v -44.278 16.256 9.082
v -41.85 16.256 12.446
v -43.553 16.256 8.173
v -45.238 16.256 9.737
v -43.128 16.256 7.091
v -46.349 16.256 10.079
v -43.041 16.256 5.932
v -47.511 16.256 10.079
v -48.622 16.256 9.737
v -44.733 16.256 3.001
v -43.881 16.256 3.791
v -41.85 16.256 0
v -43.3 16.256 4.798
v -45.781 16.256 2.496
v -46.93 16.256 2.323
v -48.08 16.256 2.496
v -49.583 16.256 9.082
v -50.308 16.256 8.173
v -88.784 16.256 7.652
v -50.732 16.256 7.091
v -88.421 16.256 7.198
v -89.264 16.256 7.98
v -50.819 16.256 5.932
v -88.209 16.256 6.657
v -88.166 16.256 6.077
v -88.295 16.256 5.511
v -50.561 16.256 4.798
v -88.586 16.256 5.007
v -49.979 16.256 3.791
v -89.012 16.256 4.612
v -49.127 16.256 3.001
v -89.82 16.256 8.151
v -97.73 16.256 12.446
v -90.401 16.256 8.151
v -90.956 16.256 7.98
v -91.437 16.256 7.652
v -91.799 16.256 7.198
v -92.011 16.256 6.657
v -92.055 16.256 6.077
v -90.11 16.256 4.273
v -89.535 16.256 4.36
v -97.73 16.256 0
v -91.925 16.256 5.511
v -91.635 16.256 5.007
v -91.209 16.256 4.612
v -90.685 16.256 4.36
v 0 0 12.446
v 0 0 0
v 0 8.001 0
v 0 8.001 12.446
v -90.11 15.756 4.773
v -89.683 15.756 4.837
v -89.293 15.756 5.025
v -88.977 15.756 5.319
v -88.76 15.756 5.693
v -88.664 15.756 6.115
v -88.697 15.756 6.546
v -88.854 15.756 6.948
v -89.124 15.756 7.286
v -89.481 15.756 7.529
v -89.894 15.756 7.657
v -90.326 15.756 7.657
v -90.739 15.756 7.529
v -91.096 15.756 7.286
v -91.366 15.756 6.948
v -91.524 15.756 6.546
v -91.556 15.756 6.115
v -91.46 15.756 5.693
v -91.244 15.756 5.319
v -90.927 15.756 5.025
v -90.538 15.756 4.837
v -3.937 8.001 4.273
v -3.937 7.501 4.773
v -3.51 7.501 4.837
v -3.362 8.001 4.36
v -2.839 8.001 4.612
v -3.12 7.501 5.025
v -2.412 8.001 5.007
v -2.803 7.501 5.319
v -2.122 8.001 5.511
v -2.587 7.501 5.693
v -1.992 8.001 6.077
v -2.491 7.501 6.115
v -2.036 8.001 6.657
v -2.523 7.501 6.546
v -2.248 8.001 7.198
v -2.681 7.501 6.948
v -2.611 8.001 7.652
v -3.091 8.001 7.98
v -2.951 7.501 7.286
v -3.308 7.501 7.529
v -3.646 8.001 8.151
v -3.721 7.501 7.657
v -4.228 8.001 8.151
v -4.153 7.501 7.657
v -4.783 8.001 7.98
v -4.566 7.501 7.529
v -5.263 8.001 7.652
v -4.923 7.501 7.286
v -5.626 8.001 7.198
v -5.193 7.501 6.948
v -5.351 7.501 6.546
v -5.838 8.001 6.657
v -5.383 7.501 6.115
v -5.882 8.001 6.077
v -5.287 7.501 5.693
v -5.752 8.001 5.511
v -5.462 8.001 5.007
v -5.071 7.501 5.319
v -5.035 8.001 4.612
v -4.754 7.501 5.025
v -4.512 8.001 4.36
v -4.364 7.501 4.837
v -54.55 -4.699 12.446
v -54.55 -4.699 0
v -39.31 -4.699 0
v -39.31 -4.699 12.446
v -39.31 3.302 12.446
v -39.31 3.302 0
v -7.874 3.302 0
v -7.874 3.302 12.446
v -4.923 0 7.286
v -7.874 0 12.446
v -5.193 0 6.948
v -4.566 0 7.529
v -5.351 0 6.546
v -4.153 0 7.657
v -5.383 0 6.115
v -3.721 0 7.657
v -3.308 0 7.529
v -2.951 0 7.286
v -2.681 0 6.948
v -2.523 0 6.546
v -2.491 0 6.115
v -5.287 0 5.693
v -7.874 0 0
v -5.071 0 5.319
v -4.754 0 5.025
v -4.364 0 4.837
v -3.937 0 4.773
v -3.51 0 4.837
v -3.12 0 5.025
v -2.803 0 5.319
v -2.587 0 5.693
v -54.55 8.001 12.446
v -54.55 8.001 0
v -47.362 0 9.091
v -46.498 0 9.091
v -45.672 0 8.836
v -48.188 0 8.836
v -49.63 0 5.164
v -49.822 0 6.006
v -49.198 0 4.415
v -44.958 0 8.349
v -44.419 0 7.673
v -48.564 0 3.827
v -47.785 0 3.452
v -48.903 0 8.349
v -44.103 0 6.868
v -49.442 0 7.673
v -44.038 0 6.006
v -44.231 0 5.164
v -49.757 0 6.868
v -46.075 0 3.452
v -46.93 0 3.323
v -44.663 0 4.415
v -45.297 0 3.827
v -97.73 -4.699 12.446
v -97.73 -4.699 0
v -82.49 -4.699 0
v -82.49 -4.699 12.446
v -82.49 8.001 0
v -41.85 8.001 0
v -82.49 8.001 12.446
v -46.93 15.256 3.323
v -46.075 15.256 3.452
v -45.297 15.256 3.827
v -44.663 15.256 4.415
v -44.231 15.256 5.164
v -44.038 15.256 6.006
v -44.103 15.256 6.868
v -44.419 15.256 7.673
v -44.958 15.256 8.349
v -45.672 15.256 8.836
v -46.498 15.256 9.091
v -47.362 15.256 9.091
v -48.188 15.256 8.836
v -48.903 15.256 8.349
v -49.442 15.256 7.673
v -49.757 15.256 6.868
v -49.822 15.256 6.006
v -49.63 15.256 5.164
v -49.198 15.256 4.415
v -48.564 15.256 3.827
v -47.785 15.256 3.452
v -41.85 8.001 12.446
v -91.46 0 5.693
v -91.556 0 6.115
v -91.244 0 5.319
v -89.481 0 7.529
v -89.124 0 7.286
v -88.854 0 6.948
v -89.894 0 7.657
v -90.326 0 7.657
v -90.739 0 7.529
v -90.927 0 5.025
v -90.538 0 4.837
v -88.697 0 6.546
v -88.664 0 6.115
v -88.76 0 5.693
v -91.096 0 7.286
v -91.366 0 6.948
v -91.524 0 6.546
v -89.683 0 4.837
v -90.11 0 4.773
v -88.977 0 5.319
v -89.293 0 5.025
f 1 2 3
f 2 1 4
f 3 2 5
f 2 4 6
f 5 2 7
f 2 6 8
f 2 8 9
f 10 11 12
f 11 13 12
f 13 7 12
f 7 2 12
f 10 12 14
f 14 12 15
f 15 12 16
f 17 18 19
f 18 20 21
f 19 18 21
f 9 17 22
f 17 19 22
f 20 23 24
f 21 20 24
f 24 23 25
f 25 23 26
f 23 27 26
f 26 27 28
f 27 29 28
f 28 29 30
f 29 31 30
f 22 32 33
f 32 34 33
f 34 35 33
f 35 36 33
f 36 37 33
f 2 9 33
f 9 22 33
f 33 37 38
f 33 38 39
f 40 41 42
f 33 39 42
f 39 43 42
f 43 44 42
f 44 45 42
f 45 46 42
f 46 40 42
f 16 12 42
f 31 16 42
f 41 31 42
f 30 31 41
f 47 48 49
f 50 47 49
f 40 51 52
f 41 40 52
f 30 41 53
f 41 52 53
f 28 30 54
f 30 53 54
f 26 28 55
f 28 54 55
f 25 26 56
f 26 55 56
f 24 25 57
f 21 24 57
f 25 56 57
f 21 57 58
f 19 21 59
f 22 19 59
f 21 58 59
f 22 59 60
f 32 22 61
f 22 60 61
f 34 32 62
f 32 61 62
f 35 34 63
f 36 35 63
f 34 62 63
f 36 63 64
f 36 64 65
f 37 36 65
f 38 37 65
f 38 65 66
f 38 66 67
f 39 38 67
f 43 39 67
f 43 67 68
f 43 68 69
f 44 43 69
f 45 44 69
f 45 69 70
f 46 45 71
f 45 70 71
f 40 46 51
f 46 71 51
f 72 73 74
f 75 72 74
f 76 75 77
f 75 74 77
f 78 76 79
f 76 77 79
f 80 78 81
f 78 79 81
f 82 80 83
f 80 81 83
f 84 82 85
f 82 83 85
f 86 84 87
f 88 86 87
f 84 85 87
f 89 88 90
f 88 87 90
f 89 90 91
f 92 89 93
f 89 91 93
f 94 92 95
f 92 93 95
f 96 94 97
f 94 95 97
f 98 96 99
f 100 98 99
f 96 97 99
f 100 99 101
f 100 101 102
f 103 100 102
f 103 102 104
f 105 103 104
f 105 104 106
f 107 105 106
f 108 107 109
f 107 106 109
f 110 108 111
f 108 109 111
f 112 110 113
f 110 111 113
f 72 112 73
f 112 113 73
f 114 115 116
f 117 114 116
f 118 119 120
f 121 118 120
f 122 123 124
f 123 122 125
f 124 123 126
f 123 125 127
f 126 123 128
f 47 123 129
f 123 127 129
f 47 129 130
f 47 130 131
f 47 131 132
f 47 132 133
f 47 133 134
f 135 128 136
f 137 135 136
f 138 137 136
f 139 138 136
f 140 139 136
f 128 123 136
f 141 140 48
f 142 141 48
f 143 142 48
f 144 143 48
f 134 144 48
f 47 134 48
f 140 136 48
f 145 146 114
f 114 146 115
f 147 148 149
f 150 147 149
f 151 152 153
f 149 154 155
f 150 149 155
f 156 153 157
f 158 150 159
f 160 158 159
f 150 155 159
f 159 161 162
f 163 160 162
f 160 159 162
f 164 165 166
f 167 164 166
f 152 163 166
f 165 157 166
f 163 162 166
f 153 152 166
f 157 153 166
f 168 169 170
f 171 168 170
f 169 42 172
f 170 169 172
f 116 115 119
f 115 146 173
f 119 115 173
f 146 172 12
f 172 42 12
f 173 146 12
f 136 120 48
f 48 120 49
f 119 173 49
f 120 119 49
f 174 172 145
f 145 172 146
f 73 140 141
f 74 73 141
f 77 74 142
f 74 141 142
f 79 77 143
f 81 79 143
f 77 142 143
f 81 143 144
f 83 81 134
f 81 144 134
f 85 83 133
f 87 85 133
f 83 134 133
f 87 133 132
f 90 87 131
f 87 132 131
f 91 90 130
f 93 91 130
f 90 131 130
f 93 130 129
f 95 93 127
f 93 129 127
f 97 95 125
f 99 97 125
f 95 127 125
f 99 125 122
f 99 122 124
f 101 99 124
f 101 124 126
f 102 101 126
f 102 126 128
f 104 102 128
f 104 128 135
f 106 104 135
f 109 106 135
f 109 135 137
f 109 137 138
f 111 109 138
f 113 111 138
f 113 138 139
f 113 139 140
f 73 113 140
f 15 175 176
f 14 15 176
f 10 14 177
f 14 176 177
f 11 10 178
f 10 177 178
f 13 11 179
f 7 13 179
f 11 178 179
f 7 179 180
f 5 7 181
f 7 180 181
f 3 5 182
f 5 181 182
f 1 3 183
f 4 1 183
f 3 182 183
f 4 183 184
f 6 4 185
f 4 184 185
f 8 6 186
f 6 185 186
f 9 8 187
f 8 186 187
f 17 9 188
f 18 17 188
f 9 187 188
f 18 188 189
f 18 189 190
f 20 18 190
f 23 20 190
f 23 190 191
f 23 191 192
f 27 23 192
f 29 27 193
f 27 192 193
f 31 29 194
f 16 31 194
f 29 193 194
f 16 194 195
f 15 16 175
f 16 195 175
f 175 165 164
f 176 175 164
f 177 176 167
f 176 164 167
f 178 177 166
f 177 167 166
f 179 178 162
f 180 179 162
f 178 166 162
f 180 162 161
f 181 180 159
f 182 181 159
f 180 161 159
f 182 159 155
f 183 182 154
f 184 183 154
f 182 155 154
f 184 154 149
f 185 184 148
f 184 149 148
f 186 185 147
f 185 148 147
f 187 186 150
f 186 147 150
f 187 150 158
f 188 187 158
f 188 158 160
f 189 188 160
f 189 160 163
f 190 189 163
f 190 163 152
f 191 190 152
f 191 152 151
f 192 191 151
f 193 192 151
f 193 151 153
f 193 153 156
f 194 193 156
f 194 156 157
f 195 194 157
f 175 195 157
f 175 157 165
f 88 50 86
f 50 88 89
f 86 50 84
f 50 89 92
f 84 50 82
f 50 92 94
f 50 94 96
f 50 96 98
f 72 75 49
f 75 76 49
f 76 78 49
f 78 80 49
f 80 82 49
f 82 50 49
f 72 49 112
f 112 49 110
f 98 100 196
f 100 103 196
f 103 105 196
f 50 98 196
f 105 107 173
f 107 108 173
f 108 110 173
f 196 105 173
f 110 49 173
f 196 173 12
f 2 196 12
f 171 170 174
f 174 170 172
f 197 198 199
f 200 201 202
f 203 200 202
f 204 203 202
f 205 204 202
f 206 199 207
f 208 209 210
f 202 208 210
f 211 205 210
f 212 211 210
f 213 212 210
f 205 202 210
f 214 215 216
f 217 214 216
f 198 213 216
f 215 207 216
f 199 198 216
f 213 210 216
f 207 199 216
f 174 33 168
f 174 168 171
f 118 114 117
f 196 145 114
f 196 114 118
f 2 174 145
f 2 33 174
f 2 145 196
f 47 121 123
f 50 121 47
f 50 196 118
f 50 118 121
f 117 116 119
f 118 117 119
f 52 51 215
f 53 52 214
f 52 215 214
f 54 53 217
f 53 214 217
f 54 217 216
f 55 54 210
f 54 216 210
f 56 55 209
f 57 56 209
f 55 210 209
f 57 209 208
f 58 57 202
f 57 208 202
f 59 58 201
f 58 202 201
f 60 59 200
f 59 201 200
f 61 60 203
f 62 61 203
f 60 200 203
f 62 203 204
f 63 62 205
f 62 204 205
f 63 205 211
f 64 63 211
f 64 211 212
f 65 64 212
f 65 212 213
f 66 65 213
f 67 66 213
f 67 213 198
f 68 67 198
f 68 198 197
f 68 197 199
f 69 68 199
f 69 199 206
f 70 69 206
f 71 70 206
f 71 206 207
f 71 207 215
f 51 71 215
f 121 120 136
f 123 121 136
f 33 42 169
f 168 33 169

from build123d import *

# Parameters (mm, degrees)
BOSS_EXTRUDE1_DEPTH = 12.446
SKETCH2_R           = 1.450000021
SKETCH2_R_2         = 2.900000042
CUT_EXTRUDE1_DEPTH  = 100.851652202
CHAMFER2_SIZE       = 0.5
CHAMFER3_SIZE       = 1


with BuildPart() as part:
    # Sketch1 → Boss-Extrude1 (new body)
    with BuildSketch(Plane.XY):
        Polygon((0, 8.001), (-41.850200018, 8.001), (-41.850200018, 16.256), (-57.090200018, 16.256), (-82.490200018, 16.256), (-97.730200018, 16.256), (-97.730200018, 8.001), (-97.730200018, -4.699), (-82.490200018, -4.699), (-82.490200018, 8.001), (-54.550200018, 8.001), (-54.550200018, -4.699), (-39.310200018, -4.699), (-39.310200018, 3.302), (-7.874, 3.302), (-7.874, 0), (0, 0), align=None)
    extrude(amount=BOSS_EXTRUDE1_DEPTH)

    # Sketch2 → Cut-Extrude1 (cut, through all)
    with BuildSketch(Plane.XZ):
        with Locations(Location((-90.110200018, 6.223, 0), (0, 0, 270))):
            Circle(SKETCH2_R)
        with Locations(Location((-46.930200018, 6.223, 0), (0, 0, 270))):
            Circle(SKETCH2_R_2)
        with Locations(Location((-3.937, 6.223, 0), (0, 0, 270))):
            Circle(SKETCH2_R)
    extrude(amount=-CUT_EXTRUDE1_DEPTH, mode=Mode.SUBTRACT)

    # Chamfer2
    chamfer2_edges = [part.edges().sort_by_distance(p)[0] for p in [
        (-90.110200018, 16.256, 7.673000021),
        (-3.937, 8.001, 7.673000021),
    ]]
    chamfer(chamfer2_edges, length=CHAMFER2_SIZE)

    # Chamfer3
    chamfer3_edges = [part.edges().sort_by_distance(p)[0] for p in [
        (-46.930200018, 16.256, 9.123000042),
    ]]
    chamfer(chamfer3_edges, length=CHAMFER3_SIZE)


solid = part.part
